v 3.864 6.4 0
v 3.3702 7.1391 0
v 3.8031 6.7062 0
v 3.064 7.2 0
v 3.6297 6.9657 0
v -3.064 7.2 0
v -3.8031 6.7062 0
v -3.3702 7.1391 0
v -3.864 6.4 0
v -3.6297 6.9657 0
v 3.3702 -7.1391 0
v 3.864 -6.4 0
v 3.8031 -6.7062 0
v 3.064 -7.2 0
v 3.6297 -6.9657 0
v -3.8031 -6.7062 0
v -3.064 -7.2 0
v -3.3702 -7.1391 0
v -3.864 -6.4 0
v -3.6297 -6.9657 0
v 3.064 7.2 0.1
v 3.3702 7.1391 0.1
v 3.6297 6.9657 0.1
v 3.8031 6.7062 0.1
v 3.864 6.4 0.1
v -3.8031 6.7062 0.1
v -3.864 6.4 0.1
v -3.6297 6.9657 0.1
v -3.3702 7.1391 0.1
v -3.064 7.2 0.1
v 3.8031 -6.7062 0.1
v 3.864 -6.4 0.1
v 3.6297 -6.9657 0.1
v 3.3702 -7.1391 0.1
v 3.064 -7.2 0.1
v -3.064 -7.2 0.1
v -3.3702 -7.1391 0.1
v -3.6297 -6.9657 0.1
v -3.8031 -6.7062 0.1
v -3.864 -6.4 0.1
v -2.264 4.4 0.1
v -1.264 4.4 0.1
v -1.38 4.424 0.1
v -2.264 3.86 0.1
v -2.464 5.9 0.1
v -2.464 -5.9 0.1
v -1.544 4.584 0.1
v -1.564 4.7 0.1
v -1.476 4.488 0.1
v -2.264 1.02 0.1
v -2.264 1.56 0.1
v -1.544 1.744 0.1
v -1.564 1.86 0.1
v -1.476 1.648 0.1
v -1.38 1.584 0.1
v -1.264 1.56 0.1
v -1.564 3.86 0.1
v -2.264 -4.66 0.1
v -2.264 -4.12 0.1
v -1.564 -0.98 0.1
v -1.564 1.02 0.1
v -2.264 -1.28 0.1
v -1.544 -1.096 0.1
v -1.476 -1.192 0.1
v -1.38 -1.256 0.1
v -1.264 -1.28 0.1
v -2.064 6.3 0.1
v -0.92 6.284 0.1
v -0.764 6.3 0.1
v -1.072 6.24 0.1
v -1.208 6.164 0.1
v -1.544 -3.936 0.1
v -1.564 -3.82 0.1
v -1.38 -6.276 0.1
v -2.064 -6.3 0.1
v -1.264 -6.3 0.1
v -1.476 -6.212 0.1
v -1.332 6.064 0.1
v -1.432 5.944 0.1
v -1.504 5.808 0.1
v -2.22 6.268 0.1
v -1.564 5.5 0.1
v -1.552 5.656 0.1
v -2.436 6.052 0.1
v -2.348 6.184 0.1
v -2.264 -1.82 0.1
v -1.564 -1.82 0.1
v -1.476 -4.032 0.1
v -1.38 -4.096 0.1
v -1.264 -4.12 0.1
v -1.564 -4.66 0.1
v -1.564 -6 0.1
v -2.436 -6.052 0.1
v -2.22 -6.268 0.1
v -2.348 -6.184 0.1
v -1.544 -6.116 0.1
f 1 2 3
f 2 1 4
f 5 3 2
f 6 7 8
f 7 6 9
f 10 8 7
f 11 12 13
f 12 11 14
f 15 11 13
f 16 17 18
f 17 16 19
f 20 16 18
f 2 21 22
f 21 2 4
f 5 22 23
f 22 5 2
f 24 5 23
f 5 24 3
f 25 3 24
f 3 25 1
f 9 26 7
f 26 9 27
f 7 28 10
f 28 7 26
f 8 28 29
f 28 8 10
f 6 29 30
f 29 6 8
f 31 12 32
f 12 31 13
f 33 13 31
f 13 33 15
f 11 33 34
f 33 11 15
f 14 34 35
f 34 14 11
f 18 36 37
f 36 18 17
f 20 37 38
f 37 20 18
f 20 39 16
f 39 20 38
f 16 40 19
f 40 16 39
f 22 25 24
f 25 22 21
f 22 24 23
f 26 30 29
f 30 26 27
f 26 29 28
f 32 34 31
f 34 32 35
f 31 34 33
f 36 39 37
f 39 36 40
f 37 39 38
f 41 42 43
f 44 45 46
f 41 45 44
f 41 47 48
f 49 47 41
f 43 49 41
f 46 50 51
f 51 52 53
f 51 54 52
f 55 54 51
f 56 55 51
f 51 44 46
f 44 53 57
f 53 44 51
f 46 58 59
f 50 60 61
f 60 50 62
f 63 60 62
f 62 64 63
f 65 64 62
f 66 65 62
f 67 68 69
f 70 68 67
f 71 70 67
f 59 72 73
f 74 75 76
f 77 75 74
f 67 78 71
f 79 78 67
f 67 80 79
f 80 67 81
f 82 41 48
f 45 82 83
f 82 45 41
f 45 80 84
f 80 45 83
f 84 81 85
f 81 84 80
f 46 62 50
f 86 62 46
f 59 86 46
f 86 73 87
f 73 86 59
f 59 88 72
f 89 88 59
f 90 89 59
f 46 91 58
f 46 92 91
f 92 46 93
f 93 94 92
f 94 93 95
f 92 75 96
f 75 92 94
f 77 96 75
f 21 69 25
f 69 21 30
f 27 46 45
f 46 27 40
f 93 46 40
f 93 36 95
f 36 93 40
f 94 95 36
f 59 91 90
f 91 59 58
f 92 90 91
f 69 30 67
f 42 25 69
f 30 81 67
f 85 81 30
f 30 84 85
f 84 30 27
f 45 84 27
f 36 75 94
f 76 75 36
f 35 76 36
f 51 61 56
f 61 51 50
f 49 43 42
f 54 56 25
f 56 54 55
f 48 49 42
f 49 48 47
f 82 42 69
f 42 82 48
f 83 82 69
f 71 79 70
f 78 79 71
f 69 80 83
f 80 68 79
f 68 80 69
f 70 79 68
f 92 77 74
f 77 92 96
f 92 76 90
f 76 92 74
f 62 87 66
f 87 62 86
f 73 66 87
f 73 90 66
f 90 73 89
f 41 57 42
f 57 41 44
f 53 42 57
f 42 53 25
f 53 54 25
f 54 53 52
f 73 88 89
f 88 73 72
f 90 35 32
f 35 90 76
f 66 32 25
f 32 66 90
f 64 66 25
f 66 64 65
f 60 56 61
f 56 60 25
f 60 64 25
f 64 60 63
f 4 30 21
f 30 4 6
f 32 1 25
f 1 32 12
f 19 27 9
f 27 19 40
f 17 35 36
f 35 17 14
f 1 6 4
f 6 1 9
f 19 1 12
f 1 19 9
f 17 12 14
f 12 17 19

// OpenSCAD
// file: ../p/1-4cyli.scad
use <../lib.scad>
function ldraw_lib__1_4cyli() = [
// 0 Cylinder 0.25
// 0 Name: 1-4cyli.dat
// 0 Author: James Jessiman
// 0 !LDRAW_ORG Primitive UPDATE 2012-01
// 0 !LICENSE Licensed under CC BY 2.0 and CC BY 4.0 : see CAreadme.txt
// 
// 0 BFC CERTIFY CCW
  [0,"BFC","CERTIFY"],
  [0,"BFC","CCW"],
// 
// 0 !HISTORY 2002-03-23 [sbliss] Added BFC statement.
// 0 !HISTORY 2002-04-25 [PTadmin] Official Update 2002-02
// 0 !HISTORY 2007-06-22 [PTadmin] Header formatted for Contributor Agreement
// 0 !HISTORY 2008-07-01 [PTadmin] Official Update 2008-01
// 0 !HISTORY 2012-02-16 [Philo] Changed to CCW
// 0 !HISTORY 2012-03-30 [PTadmin] Official Update 2012-01
// 
// 
// 4 16 1 1 0 0.9239 1 0.3827 0.9239 0 0.3827 1 0 0
  [4,16,1,1,0,0.9239,1,0.3827,0.9239,0,0.3827,1,0,0],
// 5 24 1 0 0 1 1 0 0.9239 0 0.3827 1 0 -1
  [5,24,1,0,0,1,1,0,0.9239,0,0.3827,1,0,-1],
// 4 16 0.9239 1 0.3827 0.7071 1 0.7071 0.7071 0 0.7071 0.9239 0 0.3827
  [4,16,0.9239,1,0.3827,0.7071,1,0.7071,0.7071,0,0.7071,0.9239,0,0.3827],
// 5 24 0.9239 0 0.3827 0.9239 1 0.3827 0.7071 0 0.7071 1 0 0
  [5,24,0.9239,0,0.3827,0.9239,1,0.3827,0.7071,0,0.7071,1,0,0],
// 4 16 0.7071 1 0.7071 0.3827 1 0.9239 0.3827 0 0.9239 0.7071 0 0.7071
  [4,16,0.7071,1,0.7071,0.3827,1,0.9239,0.3827,0,0.9239,0.7071,0,0.7071],
// 5 24 0.7071 0 0.7071 0.7071 1 0.7071 0.3827 0 0.9239 0.9239 0 0.3827
  [5,24,0.7071,0,0.7071,0.7071,1,0.7071,0.3827,0,0.9239,0.9239,0,0.3827],
// 4 16 0.3827 1 0.9239 0 1 1 0 0 1 0.3827 0 0.9239
  [4,16,0.3827,1,0.9239,0,1,1,0,0,1,0.3827,0,0.9239],
// 5 24 0.3827 0 0.9239 0.3827 1 0.9239 0 0 1 0.7071 0 0.7071
  [5,24,0.3827,0,0.9239,0.3827,1,0.9239,0,0,1,0.7071,0,0.7071],
// 5 24 0 0 1 0 1 1 0.3827 0 0.9239 -1 0 1
  [5,24,0,0,1,0,1,1,0.3827,0,0.9239,-1,0,1],
];
makepoly(ldraw_lib__1_4cyli(), line=0.2);
// file: ../p/1-4chrd.scad
use <../lib.scad>
function ldraw_lib__1_4chrd() = [
// 0 Chord 0.25
// 0 Name: 1-4chrd.dat
// 0 Author: Tony Hafner [hafhead]
// 0 !LDRAW_ORG Primitive UPDATE 2012-02
// 0 !LICENSE Licensed under CC BY 2.0 and CC BY 4.0 : see CAreadme.txt
// 
// 0 BFC CERTIFY CCW
  [0,"BFC","CERTIFY"],
  [0,"BFC","CCW"],
// 
// 0 !HISTORY 2004-04-22 [PTadmin] Official Update 2004-02
// 0 !HISTORY 2007-10-09 [PTadmin] Header formatted for Contributor Agreement
// 0 !HISTORY 2008-07-01 [PTadmin] Official Update 2008-01
// 0 !HISTORY 2012-08-02 [MMR1988] Re-creation with PrimGen2 and Rectifier
// 0 !HISTORY 2012-08-09 [PTadmin] Official Update 2012-02
// 
// 
// 4 16 0.9239 0 0.3827 0.3827 0 0.9239 0 0 1 1 0 0
  [4,16,0.9239,0,0.3827,0.3827,0,0.9239,0,0,1,1,0,0],
// 3 16 0.7071 0 0.7071 0.3827 0 0.9239 0.9239 0 0.3827
  [3,16,0.7071,0,0.7071,0.3827,0,0.9239,0.9239,0,0.3827],
];
makepoly(ldraw_lib__1_4chrd(), line=0.2);
// main file
use <../lib.scad>
use <6009312c.scad>
function ldraw_lib__6009312b() = [
// 0 Sticker  1.8 x  1 with Right Black Deflectors on Red Face
// 0 Name: 6009312b.dat
// 0 Author: Massimo Maso [Sirio]
// 0 !LDRAW_ORG Part UPDATE 2019-01
// 0 !LICENSE Licensed under CC BY 2.0 and CC BY 4.0 : see CAreadme.txt
// 
// 0 BFC CERTIFY CCW
  [0,"BFC","CERTIFY"],
  [0,"BFC","CCW"],
// 
// 0 !KEYWORDS Ferrari, Iveco, Polybag, Racers, Set 30191
// 
// 0 !HISTORY 2019-06-28 [PTadmin] Official Update 2019-01
// 
// 
// 1 16 0 0 0 -1 0 0 0 1 0 0 0 1 6009312c.dat
  [1,16,0,0,0,-1,0,0,0,1,0,0,0,1, ldraw_lib__6009312c()],
];
makepoly(ldraw_lib__6009312b(), line=0.2);
